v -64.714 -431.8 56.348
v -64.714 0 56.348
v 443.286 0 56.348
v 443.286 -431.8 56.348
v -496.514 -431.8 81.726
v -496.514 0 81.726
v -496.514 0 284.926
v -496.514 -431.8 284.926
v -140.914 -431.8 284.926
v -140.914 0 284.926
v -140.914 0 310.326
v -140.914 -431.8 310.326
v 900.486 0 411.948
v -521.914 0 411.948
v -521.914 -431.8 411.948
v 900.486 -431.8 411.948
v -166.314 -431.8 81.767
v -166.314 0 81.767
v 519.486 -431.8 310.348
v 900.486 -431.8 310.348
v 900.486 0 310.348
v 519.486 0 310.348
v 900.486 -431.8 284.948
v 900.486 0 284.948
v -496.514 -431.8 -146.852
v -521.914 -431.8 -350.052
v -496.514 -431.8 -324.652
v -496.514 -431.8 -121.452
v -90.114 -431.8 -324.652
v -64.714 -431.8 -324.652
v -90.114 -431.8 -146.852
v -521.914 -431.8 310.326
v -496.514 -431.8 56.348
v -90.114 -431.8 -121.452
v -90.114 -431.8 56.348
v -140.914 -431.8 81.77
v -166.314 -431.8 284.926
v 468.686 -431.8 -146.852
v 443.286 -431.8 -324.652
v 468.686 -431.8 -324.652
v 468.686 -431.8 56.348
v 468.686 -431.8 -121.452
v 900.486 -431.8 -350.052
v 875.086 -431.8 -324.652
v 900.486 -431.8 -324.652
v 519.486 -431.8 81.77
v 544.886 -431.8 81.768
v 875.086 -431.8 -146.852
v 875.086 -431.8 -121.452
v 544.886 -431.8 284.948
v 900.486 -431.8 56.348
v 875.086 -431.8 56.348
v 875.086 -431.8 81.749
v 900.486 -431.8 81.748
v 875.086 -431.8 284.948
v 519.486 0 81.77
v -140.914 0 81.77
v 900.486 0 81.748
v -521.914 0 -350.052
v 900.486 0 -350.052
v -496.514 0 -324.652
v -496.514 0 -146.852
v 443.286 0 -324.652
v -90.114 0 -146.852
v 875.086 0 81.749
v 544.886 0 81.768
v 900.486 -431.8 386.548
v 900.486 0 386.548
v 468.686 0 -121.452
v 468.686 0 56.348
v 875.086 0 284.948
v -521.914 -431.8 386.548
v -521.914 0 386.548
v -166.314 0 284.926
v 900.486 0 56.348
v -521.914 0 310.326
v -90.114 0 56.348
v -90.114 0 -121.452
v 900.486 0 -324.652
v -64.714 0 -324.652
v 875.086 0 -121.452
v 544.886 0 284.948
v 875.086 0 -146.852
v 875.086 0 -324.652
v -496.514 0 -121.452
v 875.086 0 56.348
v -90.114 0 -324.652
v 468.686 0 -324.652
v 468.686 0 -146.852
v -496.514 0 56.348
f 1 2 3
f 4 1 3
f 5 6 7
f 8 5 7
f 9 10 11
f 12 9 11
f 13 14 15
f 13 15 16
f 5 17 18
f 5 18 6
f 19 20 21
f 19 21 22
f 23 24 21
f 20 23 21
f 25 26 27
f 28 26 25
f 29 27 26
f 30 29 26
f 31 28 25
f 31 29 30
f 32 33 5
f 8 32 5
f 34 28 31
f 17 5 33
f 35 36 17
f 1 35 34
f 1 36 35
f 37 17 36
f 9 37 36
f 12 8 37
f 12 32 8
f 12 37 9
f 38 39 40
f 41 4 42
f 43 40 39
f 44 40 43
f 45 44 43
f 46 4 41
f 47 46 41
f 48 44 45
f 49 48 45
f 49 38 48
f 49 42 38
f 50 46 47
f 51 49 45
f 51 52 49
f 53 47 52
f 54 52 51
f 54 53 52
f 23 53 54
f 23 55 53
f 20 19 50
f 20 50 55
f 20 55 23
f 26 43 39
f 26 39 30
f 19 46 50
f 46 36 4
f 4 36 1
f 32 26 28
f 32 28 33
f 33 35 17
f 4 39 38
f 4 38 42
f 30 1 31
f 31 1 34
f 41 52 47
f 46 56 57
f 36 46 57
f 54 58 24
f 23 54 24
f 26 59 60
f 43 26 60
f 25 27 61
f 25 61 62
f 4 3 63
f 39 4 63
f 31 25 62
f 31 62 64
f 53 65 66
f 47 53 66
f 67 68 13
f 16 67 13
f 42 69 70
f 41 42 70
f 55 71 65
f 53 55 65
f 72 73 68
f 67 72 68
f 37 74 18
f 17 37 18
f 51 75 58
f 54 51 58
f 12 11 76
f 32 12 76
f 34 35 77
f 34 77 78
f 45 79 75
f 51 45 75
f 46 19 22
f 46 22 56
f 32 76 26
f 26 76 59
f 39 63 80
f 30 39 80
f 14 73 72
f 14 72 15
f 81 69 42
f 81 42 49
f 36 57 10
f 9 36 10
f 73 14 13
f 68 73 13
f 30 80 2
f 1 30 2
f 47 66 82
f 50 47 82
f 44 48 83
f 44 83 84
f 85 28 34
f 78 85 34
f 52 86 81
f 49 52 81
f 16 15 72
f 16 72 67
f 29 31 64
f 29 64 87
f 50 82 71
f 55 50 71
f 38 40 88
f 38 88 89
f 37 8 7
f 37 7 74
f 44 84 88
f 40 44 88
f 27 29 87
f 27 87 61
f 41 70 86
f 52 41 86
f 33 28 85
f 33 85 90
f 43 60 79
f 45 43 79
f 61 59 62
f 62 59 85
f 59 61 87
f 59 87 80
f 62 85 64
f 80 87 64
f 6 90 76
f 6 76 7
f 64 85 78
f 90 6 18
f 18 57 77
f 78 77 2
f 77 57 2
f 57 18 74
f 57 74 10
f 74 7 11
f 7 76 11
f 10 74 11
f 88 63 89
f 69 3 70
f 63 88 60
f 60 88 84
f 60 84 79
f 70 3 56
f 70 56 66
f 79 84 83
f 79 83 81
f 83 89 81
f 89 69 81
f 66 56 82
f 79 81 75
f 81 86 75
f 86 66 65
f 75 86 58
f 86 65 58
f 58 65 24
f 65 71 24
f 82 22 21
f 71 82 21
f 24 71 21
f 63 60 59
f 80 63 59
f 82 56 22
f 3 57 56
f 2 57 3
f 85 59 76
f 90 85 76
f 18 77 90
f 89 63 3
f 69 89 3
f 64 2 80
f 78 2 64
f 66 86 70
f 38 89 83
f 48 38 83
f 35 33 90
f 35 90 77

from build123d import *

# Parameters (mm, degrees)
F0_W     = 406.4
F0_H     = 25.4
F0_W_2   = 1422.4
F1_DEPTH = 431.8


with BuildPart() as f1:
    # F0 (on Front) → F1 (new body)
    with BuildSketch(Plane.XZ):
        Polygon((-521.913902, 81.722848), (-521.913902, 56.347806), (-496.513902, 56.347806), (-90.113902, 56.347806), (-64.713902, 56.347806), (443.286095, 56.347806), (468.686095, 56.347806), (875.086095, 56.347806), (900.486095, 56.347806), (900.486095, 81.747806), (875.086095, 81.749262), (544.886095, 81.768189), (519.486095, 81.769645), (-140.913905, 81.769645), (-166.313905, 81.766525), (-496.513902, 81.725968), align=None)
        Polygon((-521.913902, 310.325968), (-521.913902, 284.925968), (-496.513902, 284.925968), (-166.313902, 284.925968), (-140.913902, 284.925968), (-140.913902, 310.325968), align=None)
        Polygon((875.086094, 284.947806), (900.486094, 284.947806), (900.486094, 310.347806), (519.486095, 310.347806), (519.486095, 284.947806), (544.886096, 284.947806), align=None)
        Polygon((-521.913902, 284.925968), (-521.913902, 81.722848), (-496.513902, 81.725968), (-496.513902, 284.925968), align=None)
        Polygon((875.086095, 81.749262), (900.486095, 81.747806), (900.486094, 284.947806), (875.086094, 284.947806), align=None)
        Polygon((-166.313902, 284.925968), (-166.313905, 81.766525), (-140.913905, 81.769645), (-140.913902, 284.925968), align=None)
        Polygon((519.486095, 81.769645), (544.886095, 81.768189), (544.886096, 284.947806), (519.486095, 284.947806), align=None)
        Polygon((875.086098, -324.652194), (900.486098, -324.652194), (900.486095, 56.347806), (875.086095, 56.347806), (875.086097, -121.452194), (875.086097, -146.852194), align=None)
        Polygon((-521.913902, -324.652194), (-521.913902, -350.052194), (900.486098, -350.052194), (900.486098, -324.652194), (875.086098, -324.652194), (468.686098, -324.652194), (443.286098, -324.652194), (-64.713902, -324.652194), (-90.113902, -324.652194), (-496.513902, -324.652194), align=None)
        Polygon((443.286098, -324.652194), (468.686098, -324.652194), (468.686097, -146.852194), (468.686097, -121.452194), (468.686095, 56.347806), (443.286095, 56.347806), align=None)
        with Locations((671.886097, -134.152194)):
            Rectangle(F0_W, F0_H)
        Polygon((-521.913902, 56.347806), (-521.913902, -324.652194), (-496.513902, -324.652194), (-496.513902, -146.852194), (-496.513902, -121.452194), (-496.513902, 56.347806), align=None)
        with Locations((-293.313902, -134.152194)):
            Rectangle(F0_W, F0_H)
        with Locations((189.286098, 399.247806)):
            Rectangle(F0_W_2, F0_H)
        Polygon((-90.113902, -146.852194), (-90.113902, -324.652194), (-64.713902, -324.652194), (-64.713902, 56.347806), (-90.113902, 56.347806), (-90.113902, -121.452194), align=None)
    extrude(amount=F1_DEPTH)


solid = f1.part
